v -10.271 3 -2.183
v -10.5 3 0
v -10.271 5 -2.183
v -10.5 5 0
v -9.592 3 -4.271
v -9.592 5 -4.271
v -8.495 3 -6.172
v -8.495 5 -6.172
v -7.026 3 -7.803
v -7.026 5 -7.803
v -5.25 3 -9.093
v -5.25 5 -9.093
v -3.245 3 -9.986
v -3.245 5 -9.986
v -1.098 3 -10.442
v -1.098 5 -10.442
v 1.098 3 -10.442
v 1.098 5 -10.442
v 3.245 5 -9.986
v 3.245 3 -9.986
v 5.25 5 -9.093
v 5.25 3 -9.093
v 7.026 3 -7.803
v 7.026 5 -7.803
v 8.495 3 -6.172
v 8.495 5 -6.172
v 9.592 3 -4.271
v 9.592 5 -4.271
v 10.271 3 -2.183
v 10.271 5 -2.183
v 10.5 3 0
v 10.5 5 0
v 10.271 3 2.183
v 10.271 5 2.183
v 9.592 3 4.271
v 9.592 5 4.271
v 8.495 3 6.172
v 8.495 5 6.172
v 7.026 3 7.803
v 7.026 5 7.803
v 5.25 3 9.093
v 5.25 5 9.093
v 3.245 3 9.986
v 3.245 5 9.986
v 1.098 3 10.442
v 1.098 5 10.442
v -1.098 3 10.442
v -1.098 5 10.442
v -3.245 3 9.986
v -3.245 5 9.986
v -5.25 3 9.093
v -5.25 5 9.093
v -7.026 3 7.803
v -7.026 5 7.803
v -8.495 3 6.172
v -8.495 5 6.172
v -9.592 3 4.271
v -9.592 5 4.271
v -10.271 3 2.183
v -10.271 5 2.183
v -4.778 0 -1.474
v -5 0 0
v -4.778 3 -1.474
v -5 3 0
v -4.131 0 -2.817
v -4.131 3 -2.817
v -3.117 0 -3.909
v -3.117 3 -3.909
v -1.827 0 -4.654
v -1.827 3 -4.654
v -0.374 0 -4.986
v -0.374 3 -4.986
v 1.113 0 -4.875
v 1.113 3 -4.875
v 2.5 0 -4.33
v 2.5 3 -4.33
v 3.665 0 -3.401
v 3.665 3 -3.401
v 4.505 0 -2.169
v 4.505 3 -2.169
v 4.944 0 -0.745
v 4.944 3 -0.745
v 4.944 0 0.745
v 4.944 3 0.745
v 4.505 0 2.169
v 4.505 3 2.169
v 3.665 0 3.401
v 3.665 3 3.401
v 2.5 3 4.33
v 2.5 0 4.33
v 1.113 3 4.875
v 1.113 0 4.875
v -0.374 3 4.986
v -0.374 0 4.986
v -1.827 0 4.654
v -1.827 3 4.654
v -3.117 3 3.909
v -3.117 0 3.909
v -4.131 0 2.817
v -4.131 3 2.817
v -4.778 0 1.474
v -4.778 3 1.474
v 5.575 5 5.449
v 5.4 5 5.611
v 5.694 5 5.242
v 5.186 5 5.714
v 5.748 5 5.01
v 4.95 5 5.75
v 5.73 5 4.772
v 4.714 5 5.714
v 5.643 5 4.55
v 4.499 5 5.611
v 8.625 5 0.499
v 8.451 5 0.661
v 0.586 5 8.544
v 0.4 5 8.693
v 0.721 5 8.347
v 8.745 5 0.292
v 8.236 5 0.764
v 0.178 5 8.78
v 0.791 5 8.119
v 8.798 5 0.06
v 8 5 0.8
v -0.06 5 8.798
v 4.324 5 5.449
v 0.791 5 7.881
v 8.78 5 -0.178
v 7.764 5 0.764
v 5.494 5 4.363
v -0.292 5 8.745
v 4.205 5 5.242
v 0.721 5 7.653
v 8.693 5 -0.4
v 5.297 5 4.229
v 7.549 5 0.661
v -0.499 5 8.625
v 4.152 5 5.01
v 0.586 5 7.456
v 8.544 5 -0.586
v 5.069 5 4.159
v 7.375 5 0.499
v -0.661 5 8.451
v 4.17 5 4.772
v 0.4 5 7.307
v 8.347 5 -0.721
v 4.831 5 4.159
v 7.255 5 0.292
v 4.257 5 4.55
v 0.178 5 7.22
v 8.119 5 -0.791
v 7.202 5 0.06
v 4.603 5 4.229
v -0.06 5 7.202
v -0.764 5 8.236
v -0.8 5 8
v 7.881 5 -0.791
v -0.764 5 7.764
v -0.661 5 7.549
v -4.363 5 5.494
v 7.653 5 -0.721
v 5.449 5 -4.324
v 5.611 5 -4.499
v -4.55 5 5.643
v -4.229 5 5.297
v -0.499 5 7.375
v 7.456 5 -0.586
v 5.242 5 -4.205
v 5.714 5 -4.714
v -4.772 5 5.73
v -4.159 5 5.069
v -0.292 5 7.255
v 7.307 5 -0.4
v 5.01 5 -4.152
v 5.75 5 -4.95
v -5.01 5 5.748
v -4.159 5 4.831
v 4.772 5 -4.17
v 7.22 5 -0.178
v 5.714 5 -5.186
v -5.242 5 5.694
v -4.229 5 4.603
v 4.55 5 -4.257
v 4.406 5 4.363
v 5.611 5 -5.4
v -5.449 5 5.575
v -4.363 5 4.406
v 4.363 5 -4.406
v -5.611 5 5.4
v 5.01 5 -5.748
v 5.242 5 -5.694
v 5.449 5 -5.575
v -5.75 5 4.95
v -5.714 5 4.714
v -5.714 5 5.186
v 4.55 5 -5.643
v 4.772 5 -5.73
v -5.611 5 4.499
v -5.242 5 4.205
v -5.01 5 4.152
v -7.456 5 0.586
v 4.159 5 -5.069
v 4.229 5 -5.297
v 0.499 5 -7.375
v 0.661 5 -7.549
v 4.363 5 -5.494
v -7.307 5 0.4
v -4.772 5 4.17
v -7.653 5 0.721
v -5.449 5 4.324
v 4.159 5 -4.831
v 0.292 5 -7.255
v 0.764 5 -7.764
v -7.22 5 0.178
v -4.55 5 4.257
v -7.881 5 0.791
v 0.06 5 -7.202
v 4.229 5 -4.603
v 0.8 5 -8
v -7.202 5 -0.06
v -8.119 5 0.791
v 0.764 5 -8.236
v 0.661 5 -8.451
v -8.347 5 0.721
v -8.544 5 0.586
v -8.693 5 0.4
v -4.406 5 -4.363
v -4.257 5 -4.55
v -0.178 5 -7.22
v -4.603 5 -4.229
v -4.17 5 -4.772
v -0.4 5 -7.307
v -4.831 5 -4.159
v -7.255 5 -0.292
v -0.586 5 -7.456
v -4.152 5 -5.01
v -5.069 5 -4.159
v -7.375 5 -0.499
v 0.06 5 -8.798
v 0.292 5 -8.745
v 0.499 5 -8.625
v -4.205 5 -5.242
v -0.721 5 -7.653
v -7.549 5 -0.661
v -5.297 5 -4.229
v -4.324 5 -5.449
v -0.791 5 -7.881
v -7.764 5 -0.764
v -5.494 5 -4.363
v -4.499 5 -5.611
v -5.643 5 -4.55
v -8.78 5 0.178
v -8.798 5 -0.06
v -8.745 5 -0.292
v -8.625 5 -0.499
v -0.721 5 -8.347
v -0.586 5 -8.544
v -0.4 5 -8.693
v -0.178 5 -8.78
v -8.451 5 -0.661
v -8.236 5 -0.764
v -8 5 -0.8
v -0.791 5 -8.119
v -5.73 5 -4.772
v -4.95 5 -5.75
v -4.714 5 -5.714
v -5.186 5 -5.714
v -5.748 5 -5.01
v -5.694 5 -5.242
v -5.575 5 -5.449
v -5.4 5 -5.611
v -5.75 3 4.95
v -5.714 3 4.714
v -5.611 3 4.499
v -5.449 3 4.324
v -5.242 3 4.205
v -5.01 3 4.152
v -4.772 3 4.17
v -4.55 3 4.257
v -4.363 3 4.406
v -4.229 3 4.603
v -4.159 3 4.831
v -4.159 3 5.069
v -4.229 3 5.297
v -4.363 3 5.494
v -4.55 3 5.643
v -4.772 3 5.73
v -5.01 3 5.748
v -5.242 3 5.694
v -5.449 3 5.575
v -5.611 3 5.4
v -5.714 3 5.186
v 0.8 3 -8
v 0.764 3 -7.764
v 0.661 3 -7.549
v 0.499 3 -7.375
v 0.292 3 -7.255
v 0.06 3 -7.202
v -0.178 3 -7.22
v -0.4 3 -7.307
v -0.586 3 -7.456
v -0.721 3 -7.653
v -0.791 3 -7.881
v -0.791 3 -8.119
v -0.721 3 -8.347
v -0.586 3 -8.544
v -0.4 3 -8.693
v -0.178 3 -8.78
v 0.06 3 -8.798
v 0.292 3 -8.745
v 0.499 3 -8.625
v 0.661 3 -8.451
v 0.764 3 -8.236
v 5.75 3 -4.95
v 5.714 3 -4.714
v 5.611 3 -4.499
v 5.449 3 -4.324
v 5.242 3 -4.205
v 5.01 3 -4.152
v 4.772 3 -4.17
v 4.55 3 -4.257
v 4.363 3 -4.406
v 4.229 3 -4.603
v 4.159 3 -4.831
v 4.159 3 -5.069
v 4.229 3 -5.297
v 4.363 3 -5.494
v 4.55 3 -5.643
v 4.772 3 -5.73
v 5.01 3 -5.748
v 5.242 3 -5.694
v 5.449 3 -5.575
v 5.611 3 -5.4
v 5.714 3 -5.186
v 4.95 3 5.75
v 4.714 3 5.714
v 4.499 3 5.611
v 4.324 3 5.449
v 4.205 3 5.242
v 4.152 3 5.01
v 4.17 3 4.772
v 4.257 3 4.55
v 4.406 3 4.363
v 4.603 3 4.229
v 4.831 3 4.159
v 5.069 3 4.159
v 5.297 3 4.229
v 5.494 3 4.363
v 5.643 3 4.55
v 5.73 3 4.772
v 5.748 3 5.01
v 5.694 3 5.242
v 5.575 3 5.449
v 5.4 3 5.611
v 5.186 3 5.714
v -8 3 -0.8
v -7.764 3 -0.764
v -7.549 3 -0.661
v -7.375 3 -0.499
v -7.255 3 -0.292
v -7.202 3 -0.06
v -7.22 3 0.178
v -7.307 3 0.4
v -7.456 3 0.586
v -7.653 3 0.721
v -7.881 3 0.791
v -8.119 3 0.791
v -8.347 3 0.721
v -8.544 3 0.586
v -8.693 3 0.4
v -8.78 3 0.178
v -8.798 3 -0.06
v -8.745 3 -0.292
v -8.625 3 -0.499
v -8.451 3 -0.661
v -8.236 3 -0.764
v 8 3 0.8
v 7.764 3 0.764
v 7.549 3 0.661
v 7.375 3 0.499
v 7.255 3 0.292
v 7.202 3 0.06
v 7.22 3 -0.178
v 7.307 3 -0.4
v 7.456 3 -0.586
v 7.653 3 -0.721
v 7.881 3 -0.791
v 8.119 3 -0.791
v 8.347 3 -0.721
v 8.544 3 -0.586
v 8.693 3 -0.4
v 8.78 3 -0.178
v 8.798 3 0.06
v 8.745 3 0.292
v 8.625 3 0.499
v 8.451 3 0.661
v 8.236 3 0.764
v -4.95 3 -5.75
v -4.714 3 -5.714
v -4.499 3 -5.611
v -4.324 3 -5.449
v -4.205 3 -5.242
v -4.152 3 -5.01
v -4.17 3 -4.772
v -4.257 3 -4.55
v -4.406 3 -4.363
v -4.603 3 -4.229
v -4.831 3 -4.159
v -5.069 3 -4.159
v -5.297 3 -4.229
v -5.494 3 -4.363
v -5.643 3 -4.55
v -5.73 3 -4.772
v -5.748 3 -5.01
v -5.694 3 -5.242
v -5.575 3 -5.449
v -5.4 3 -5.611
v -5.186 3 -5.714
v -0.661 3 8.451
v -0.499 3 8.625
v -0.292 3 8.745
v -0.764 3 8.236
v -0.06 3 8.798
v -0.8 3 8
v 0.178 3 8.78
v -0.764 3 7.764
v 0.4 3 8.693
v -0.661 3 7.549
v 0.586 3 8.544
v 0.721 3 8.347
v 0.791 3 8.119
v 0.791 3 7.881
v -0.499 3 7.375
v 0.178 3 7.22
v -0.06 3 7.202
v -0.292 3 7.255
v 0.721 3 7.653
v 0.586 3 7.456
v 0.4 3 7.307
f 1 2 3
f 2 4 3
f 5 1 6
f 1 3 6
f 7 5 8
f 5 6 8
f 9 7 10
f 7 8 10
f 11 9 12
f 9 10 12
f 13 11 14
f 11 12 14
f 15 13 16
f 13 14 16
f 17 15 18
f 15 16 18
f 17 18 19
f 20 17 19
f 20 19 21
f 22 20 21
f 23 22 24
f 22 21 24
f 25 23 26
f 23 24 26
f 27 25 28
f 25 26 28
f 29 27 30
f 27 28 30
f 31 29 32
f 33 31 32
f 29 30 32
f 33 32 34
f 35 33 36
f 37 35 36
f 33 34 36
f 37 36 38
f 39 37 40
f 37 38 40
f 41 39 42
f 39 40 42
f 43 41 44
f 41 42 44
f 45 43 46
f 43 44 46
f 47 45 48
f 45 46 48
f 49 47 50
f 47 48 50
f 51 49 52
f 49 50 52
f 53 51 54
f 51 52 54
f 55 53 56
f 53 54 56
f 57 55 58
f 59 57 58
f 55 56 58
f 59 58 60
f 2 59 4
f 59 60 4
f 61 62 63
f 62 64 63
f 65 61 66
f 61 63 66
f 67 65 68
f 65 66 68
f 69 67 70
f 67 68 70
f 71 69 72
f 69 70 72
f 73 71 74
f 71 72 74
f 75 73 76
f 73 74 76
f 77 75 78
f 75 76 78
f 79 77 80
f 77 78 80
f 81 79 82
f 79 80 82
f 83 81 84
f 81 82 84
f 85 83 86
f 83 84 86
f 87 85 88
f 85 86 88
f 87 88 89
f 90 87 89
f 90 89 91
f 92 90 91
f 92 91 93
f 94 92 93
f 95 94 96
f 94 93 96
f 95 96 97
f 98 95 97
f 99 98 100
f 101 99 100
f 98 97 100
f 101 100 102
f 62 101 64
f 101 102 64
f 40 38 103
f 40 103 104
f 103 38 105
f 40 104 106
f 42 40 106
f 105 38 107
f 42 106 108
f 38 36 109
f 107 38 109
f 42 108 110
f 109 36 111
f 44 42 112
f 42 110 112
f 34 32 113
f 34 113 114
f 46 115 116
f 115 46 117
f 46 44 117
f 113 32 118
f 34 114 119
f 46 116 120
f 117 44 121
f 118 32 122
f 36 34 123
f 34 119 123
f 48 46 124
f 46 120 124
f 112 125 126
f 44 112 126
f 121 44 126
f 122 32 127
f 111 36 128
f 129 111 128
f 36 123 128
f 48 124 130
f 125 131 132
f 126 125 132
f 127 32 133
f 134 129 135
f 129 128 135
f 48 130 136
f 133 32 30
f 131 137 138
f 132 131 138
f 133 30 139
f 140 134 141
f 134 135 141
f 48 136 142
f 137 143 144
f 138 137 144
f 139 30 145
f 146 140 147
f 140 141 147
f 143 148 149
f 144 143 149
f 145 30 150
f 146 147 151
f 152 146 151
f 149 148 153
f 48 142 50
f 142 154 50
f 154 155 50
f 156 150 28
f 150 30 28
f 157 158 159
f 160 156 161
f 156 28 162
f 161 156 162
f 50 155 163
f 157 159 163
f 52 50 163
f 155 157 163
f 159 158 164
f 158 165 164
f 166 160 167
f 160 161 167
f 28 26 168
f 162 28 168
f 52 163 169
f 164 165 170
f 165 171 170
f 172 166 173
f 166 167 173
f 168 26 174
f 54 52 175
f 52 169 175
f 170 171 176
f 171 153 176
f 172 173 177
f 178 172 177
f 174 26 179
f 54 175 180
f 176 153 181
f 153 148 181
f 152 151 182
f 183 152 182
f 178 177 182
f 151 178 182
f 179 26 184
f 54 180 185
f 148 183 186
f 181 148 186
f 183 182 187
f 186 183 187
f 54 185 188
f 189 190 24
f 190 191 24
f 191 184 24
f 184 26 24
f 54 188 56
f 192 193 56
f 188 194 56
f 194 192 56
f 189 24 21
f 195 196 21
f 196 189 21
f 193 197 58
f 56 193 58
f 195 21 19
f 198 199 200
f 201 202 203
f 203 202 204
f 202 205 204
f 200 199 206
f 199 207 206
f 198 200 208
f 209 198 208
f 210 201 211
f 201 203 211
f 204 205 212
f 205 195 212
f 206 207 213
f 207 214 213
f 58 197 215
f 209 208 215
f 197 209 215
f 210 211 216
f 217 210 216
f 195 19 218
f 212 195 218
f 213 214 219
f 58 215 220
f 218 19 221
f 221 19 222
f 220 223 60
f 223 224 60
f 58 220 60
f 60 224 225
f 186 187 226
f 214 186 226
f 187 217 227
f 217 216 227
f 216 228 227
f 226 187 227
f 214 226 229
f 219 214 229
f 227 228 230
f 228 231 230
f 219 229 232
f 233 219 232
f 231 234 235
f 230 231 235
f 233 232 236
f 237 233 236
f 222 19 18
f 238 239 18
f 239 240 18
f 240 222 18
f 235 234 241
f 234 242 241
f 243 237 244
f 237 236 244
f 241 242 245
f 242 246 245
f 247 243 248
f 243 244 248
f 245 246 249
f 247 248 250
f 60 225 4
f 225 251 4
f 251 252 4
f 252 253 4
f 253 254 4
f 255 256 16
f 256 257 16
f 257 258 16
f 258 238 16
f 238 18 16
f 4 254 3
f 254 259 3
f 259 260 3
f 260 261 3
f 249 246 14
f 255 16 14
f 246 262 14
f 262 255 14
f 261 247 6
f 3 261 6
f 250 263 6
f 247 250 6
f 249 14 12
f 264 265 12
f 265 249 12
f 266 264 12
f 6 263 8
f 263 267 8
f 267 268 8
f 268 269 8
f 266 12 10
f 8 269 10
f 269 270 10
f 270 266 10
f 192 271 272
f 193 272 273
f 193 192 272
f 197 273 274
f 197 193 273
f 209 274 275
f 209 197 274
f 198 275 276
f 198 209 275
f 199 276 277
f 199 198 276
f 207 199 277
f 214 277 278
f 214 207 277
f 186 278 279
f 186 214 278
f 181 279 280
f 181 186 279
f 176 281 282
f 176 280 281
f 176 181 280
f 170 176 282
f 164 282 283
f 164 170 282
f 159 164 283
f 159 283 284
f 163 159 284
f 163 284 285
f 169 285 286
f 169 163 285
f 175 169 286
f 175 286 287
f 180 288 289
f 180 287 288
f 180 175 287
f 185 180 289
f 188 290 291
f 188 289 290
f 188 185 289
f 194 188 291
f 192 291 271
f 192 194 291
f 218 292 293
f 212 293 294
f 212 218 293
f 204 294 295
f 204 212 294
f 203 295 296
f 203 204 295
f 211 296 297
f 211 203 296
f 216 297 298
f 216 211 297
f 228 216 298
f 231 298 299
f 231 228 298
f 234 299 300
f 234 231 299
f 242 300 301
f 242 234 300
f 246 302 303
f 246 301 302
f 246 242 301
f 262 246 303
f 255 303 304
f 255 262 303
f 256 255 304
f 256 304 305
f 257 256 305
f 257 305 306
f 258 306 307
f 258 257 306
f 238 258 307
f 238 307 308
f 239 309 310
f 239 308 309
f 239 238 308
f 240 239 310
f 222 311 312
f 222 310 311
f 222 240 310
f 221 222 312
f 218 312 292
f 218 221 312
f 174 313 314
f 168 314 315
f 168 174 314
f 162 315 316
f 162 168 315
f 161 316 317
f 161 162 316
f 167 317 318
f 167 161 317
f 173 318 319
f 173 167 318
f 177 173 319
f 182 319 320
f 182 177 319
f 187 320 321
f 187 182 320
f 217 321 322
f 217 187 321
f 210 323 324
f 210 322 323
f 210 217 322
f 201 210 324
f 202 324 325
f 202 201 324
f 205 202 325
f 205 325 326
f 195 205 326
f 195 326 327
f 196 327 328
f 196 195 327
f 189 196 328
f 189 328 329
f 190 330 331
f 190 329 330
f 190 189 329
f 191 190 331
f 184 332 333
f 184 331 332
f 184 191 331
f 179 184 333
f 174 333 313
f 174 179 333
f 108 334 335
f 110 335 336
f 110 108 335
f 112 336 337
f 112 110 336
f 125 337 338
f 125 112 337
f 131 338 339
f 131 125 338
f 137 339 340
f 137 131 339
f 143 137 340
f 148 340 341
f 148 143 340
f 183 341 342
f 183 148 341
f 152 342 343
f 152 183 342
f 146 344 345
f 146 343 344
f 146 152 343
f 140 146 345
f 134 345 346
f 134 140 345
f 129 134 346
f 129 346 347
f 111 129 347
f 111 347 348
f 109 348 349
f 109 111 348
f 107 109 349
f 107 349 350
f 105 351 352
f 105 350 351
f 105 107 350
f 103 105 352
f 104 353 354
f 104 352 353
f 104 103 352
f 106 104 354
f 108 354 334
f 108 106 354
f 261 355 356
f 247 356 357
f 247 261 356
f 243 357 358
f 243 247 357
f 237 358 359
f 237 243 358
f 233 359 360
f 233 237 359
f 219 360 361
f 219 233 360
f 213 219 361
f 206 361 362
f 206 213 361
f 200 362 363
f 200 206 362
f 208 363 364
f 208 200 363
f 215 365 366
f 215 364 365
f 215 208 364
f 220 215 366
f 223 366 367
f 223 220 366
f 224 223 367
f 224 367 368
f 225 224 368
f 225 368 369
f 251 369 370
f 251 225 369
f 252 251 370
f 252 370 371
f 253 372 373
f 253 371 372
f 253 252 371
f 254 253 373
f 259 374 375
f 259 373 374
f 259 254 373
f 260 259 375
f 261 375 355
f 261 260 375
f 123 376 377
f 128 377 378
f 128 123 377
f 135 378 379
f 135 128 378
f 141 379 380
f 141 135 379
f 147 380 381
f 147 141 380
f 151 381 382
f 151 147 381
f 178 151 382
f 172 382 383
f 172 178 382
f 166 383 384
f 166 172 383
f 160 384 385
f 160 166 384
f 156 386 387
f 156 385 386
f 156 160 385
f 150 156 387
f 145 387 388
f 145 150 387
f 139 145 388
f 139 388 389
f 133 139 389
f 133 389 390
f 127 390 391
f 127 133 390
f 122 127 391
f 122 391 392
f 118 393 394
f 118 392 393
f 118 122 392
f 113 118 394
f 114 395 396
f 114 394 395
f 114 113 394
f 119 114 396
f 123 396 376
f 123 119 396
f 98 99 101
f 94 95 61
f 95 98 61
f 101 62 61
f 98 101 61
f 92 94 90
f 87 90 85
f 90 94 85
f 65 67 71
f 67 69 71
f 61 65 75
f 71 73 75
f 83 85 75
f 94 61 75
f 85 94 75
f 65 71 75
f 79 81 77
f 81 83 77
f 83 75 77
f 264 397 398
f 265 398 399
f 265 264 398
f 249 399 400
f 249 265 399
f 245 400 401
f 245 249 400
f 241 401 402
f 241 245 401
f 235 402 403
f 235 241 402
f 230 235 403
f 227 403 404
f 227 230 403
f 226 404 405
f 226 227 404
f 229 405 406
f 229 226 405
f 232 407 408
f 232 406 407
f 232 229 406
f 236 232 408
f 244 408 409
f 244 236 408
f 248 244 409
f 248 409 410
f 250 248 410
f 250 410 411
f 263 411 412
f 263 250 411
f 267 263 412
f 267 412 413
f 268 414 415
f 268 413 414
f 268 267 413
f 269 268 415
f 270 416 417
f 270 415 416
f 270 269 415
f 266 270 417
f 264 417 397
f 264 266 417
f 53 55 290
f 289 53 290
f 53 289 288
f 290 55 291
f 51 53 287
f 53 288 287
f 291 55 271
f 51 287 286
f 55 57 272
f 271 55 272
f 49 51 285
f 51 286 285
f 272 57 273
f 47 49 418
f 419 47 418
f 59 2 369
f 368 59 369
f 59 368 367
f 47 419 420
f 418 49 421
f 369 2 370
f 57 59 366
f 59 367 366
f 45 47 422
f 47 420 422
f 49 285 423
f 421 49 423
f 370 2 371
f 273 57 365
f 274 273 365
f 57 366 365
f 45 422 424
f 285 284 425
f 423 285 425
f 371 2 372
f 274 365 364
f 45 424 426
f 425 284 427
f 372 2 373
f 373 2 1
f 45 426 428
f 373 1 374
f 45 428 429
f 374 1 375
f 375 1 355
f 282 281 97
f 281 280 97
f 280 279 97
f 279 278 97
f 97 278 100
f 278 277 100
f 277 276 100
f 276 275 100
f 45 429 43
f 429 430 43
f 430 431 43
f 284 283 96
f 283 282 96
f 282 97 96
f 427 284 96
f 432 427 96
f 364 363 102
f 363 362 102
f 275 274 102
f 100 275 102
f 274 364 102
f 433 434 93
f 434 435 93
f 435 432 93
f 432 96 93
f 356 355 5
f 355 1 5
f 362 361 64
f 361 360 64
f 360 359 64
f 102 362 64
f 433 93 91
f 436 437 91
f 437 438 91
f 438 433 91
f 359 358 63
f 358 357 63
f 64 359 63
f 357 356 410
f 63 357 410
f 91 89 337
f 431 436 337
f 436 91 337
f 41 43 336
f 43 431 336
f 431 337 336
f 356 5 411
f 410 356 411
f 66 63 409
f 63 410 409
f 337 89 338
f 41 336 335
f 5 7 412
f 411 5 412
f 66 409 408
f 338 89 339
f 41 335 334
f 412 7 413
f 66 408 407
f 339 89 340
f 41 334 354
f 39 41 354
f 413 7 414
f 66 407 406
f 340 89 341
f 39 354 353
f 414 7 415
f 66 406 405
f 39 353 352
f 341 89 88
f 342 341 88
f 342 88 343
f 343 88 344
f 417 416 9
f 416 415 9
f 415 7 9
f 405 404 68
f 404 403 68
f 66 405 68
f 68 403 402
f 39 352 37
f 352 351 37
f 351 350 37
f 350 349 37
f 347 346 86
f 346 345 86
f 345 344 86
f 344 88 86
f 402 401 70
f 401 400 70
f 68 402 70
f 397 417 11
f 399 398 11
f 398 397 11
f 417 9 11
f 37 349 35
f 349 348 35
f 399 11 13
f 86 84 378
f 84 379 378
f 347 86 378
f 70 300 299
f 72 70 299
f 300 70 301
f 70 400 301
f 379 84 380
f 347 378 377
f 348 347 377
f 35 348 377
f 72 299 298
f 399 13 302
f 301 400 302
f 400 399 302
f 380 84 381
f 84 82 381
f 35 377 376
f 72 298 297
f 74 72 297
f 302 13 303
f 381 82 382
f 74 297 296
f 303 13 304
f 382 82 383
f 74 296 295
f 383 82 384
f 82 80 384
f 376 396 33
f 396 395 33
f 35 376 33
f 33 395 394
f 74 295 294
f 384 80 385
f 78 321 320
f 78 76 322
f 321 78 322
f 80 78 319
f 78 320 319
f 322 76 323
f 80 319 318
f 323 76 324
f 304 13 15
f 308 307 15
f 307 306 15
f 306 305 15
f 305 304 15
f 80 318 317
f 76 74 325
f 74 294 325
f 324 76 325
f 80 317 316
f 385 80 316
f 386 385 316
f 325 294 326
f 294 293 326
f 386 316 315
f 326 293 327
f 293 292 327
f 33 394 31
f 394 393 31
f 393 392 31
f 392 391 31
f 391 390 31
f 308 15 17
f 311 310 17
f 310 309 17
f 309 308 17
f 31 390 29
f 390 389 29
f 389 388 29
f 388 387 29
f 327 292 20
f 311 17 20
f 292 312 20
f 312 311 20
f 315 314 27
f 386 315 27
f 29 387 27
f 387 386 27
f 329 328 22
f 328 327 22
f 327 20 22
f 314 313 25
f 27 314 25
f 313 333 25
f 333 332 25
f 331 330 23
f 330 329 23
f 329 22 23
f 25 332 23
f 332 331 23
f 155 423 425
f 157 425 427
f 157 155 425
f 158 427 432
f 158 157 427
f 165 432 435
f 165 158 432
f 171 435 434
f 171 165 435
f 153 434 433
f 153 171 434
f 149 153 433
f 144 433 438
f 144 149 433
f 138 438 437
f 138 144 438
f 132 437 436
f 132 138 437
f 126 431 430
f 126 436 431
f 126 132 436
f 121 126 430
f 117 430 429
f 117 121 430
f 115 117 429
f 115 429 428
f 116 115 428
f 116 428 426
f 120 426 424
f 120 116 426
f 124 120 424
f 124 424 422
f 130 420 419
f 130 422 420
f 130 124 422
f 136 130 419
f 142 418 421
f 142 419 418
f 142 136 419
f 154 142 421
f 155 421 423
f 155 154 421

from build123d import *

# Parameters (mm, degrees)
M2_TAPPED_HOLE1_AT_2_COUNT = 2
M2_TAPPED_HOLE1_AT_2_PITCH = 5.814124225
CIRPATTERN1_COUNT          = 4


with BuildPart() as part:
    # Sketch1 → Revolve1 (revolve)
    with BuildSketch(Plane.XY):
        Polygon((-5, 0), (-5, 3), (-10.5, 3), (-10.5, 5), (0, 5), (0, 0), align=None)
    revolve(axis=Axis((0, 5, 0), (0, -1, 0)))

    # Sketch4 → M2 Tapped Hole1 (revolve, cut)
    with BuildSketch(Plane(origin=(8, 5, 0), x_dir=(0, 0, 1), z_dir=(1, 0, 0))):
        Polygon((0, 0), (0, 6.480688495), (0.8, 6), (0.8, 0), align=None)
    m2_tapped_hole1 = revolve(axis=Axis((8, 11.35, 0), (0, -1, 0)), mode=Mode.SUBTRACT)

    # M2 Tapped Hole1 at 2: M2 Tapped Hole1 ×2
    with Locations(*[Vector(-0.524628029, 0, 0.851331564) * (i * M2_TAPPED_HOLE1_AT_2_PITCH) for i in range(1, M2_TAPPED_HOLE1_AT_2_COUNT)]):
        add(m2_tapped_hole1, mode=Mode.SUBTRACT)

    # CirPattern1: M2 Tapped Hole1 ×4 about axis
    cirpattern1_axis = Axis((0, 0, 0), (0, 1, 0))
    for i in range(1, CIRPATTERN1_COUNT):
        add(m2_tapped_hole1.rotate(cirpattern1_axis, i * 360 / CIRPATTERN1_COUNT), mode=Mode.SUBTRACT)

    # CirPattern1 copy 1 sketch → CirPattern1 copy 1 (revolve, cut)
    with BuildSketch(Plane(origin=(4.949747468, 5, -4.949747468), x_dir=(1, 0, 0), z_dir=(0, 0, -1))):
        Polygon((0, 0), (0, 6.480688495), (0.8, 6), (0.8, 0), align=None)
    revolve(axis=Axis((4.949747468, 11.35, -4.949747468), (0, -1, 0)), mode=Mode.SUBTRACT)

    # CirPattern1 copy 2 sketch → CirPattern1 copy 2 (revolve, cut)
    with BuildSketch(Plane(origin=(-4.949747468, 5, -4.949747468), x_dir=(0, 0, -1), z_dir=(-1, 0, 0))):
        Polygon((0, 0), (0, 6.480688495), (0.8, 6), (0.8, 0), align=None)
    revolve(axis=Axis((-4.949747468, 11.35, -4.949747468), (0, -1, 0)), mode=Mode.SUBTRACT)

    # CirPattern1 copy 3 sketch → CirPattern1 copy 3 (revolve, cut)
    with BuildSketch(Plane(origin=(-4.949747468, 5, 4.949747468), x_dir=(-1, 0, 0), z_dir=(0, 0, 1))):
        Polygon((0, 0), (0, 6.480688495), (0.8, 6), (0.8, 0), align=None)
    revolve(axis=Axis((-4.949747468, 11.35, 4.949747468), (0, -1, 0)), mode=Mode.SUBTRACT)


solid = part.part
